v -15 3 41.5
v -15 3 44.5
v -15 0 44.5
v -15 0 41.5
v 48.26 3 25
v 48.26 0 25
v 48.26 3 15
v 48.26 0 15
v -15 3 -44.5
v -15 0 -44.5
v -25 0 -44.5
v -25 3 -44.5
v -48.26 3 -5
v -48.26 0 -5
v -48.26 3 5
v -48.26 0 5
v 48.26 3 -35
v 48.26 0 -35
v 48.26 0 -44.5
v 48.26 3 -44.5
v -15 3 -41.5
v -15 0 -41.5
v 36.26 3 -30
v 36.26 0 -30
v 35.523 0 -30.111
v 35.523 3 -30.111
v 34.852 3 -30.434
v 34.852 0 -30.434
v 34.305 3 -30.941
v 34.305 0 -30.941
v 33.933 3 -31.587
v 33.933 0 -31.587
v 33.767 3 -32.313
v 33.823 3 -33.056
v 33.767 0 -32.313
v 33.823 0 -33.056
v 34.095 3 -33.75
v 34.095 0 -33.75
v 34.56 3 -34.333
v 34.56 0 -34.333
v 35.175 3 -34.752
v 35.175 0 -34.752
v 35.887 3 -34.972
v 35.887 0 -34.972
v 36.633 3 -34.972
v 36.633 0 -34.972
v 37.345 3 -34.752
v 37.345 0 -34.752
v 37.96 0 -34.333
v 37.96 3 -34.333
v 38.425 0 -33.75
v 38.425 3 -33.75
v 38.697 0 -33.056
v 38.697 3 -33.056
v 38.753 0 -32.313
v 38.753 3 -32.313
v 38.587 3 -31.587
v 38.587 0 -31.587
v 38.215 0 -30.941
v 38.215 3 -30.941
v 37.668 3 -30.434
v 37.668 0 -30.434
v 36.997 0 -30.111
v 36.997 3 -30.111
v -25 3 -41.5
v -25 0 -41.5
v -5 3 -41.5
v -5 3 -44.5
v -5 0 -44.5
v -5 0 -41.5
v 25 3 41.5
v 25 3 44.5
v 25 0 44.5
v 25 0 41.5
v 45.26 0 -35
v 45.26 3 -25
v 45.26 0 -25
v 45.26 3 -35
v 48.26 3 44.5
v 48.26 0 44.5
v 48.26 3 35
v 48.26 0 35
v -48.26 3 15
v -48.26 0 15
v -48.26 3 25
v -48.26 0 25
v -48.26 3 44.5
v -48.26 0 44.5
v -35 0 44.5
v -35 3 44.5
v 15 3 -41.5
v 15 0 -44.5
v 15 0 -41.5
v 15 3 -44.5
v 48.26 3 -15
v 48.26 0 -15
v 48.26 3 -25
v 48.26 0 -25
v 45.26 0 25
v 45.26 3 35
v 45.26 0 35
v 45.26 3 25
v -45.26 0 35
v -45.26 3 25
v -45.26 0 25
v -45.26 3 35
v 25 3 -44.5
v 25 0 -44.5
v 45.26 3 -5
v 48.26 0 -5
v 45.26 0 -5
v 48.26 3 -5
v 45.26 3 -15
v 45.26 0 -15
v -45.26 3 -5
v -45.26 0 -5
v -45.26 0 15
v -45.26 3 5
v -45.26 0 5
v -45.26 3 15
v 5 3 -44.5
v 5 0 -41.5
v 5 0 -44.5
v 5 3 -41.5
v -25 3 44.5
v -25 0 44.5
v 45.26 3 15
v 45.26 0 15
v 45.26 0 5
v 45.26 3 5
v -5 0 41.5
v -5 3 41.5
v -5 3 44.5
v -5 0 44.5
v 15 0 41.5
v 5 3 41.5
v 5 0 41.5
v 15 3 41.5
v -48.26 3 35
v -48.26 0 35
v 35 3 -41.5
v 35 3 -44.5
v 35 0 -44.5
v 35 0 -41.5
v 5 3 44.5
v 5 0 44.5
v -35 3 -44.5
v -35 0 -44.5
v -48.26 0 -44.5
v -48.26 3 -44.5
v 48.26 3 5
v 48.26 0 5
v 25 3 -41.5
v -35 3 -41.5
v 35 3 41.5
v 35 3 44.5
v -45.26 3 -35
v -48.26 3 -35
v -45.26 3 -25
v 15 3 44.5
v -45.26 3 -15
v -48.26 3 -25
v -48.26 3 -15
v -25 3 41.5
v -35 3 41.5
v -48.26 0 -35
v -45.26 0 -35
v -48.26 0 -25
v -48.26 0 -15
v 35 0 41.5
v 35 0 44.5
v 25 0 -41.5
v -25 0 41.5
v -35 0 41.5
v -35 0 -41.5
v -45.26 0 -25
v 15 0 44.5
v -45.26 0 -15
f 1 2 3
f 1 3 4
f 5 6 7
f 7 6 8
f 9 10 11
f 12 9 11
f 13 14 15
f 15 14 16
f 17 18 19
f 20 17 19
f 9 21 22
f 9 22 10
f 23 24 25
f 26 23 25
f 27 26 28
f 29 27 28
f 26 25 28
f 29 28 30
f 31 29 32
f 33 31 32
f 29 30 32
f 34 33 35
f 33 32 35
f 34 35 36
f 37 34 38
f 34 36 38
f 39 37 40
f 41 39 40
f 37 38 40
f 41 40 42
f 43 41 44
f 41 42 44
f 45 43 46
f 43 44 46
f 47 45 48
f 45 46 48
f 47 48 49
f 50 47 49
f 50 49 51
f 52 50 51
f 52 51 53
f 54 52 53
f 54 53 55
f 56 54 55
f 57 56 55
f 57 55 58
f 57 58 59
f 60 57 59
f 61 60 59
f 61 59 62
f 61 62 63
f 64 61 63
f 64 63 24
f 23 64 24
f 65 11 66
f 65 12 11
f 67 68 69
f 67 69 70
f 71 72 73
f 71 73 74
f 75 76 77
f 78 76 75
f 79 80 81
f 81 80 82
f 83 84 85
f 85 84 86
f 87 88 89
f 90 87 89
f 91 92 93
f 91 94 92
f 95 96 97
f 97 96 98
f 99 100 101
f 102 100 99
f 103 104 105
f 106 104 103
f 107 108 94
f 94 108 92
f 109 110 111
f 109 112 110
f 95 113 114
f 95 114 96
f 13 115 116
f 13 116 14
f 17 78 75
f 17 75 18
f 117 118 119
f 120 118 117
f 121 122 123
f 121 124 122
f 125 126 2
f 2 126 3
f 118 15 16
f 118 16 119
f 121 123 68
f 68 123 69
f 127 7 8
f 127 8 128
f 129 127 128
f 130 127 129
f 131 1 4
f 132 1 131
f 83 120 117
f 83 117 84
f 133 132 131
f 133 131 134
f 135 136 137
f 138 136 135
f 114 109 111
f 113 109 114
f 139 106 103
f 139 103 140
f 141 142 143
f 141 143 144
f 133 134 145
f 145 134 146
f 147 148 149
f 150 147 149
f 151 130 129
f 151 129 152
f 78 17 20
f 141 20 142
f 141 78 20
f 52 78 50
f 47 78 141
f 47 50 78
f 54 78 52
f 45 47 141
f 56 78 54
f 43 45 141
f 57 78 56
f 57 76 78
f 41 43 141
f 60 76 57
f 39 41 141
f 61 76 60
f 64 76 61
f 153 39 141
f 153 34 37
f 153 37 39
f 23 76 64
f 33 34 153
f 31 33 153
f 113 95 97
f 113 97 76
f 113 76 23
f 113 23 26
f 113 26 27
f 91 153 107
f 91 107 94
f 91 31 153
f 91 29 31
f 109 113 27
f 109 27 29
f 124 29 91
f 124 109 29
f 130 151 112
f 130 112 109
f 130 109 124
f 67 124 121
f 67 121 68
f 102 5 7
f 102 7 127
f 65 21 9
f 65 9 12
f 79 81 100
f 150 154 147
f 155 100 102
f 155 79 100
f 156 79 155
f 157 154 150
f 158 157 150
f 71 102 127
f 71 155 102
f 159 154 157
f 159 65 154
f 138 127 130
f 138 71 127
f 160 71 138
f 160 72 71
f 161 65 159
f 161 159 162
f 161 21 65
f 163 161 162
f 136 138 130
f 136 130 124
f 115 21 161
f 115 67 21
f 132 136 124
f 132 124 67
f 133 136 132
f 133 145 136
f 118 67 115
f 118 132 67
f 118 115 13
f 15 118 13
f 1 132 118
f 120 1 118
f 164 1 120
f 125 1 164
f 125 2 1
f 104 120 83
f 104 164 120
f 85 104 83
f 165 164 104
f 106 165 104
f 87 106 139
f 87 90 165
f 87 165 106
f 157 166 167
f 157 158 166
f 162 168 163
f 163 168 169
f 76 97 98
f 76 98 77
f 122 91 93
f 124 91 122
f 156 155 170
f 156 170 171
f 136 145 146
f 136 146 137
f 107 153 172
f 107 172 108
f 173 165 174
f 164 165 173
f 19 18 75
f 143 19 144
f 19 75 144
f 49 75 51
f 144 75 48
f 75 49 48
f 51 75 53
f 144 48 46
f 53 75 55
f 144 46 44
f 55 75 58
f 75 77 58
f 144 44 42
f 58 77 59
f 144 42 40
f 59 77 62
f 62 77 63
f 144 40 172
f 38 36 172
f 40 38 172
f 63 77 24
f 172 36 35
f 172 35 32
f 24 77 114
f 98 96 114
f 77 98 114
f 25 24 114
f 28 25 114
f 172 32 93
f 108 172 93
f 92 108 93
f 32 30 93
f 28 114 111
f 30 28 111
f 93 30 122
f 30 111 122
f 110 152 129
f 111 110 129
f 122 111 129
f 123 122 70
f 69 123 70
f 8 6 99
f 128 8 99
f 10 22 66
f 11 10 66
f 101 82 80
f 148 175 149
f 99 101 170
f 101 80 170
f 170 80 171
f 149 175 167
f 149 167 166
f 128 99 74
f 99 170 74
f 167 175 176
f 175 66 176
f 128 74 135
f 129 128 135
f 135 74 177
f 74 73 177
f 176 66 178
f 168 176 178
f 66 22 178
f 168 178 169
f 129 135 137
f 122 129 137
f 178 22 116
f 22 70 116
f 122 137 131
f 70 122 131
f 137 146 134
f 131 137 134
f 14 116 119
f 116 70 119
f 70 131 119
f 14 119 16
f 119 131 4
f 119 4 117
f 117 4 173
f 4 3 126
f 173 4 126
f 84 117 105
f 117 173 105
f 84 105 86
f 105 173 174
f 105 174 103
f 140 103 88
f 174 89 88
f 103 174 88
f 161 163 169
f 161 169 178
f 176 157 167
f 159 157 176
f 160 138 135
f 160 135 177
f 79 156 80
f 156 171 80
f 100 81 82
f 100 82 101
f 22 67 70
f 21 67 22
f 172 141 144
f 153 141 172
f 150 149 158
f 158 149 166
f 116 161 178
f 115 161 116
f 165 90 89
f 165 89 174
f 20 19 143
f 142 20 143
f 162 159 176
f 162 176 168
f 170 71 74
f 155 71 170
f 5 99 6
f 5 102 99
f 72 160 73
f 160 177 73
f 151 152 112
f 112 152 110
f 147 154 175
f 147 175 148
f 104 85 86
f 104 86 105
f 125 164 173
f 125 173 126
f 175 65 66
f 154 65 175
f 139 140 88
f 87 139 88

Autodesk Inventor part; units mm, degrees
ref_plane "YZ Plane" through (0, 0, 0) normal (1, 0, 0) x (0, 1, 0)
ref_plane "XZ Plane" through (0, 0, 0) normal (0, 1, 0) x (-1, 0, 0)
ref_plane "XY Plane" through (0, 0, 0) normal (0, 0, 1) x (1, 0, 0)
sketch "Rectangle" plane through (0, 0, 0) normal (0, 1, 0) x (-1, 0, 0)
  line L0 (-48.26, -44.5) -> (48.26, -44.5)
  line L1 (48.26, -44.5) -> (48.26, 44.5)
  line L2 (48.26, 44.5) -> (-48.26, 44.5)
  line L3 (-48.26, 44.5) -> (-48.26, -44.5)
  line L4 (-48.26, -44.5) -> (48.26, 44.5) construction
  line L5 (48.26, -44.5) -> (-48.26, 44.5) construction
  point P0 (0, 0)
  dimension "d12" = 96.52
  dimension "d13" = 89
extrude "Extrusion1" add sketch "Rectangle" along normal blind 3
sketch "Sketch3" plane through (0, 3, 0) normal (0, 1, 0) x (1, 0, 0)
  line L0 (48.26, 44.5) -> (-48.26, 44.5) construction
  line L1 (-15, 44.5) -> (-5, 44.5)
  line L2 (-5, 44.5) -> (-5, 41.5)
  line L3 (-5, 41.5) -> (-15, 41.5)
  line L4 (-15, 41.5) -> (-15, 44.5)
  line L5 (0, 62.3) -> (0, -62.3) construction
  point P0 (0, 0)
  dimension "d14" = 10
  dimension "d16" = 3
  dimension "d22" = 5
extrude "Extrusion3" cut sketch "Sketch3" against normal through all
pattern_linear "Rectangular Pattern2" count 2 spacing 20 along (-1, 0, 0) count 2 spacing 40 along (1, 0, 0) of "Extrusion3"
mirror "Mirror2" about plane through (0, 0, 0) normal (0, 0, 1) of "Extrusion3", "Rectangular Pattern2"
sketch "Sketch4" plane through (0, 3, 0) normal (0, 1, 0) x (1, 0, 0)
  line L0 (67.564, 0) -> (-67.564, 0) construction
  line L1 (-48.26, 44.5) -> (-48.26, -44.5) construction
  line L2 (-48.26, 15) -> (-45.26, 15)
  line L3 (-45.26, 15) -> (-45.26, 5)
  line L4 (-45.26, 5) -> (-48.26, 5)
  line L5 (-48.26, 5) -> (-48.26, 15)
  point P0 (0, 0)
  dimension "d23" = 3
  dimension "d24" = 10
  dimension "d25" = 5
extrude "Extrusion4" cut sketch "Sketch4" against normal through all
pattern_linear "Rectangular Pattern3" count 2 spacing 20 along (0, 0, -1) count 2 spacing 40 along (0, 0, 1) of "Extrusion4"
mirror "Mirror4" about plane through (0, 0, 0) normal (1, 0, 0) of "Extrusion4", "Rectangular Pattern3"
sketch "Sketch5" plane through (0, 3, 0) normal (0, 1, 0) x (1, 0, 0)
  line L0 (48.26, 35) -> (48.26, 44.5) construction
  line L1 (48.26, 44.5) -> (35, 44.5) construction
  point P0 (0, 0)
  point P1 (36.26, 32.5)
  dimension "d31" = 12
  dimension "d32" = 12
hole "Hole1" at (36.26, 3, -32.5) direction (0, -1, 0) diameter 5 end through all
equation "\"d12\" = Module_Width"
equation "\"d13\" = Module_Height"
equation "\"d2\" = Module_Case_Thickness"
equation "\"d14\" = Module_Case_SlotWidth"
equation "\"d16\" = Module_Case_SlotDepth"
equation "\"d22\" = 0.5 * Module_Case_SlotWidth"
equation "\"d21\" = 2 * Module_Case_SlotWidth"
equation "\"d42\" = 4 * Module_Case_SlotWidth"
equation "\"d23\" = Module_Case_SlotDepth"
equation "\"d24\" = Module_Case_SlotWidth"
equation "\"d25\" = 0.5 * Module_Case_SlotWidth"
equation "\"d30\" = 2 * Module_Case_SlotWidth"
equation "\"d45\" = 4 * Module_Case_SlotWidth"
equation "\"d33\" = Module_StatusIndicatorDiameter"
equation "\"RackWidth\" = 482.6"
equation "\"U\" = 44.5"
equation "\"Module_Connector_Width\" = 6"
equation "\"Module_Case_SlotWidth\" = 10"
equation "\"Module_Case_SlotDepth\" = 3"
equation "\"Module_Back_Thickness\" = 5"
equation "\"Module_Connector_Depth\" = 4"
equation "\"Module_Height\" = 89"
equation "\"Module_Width\" = 96.52"
equation "\"Module_Case_Thickness\" = 3"
equation "\"Module_StatusIndicatorDiameter\" = 5"
equation "\"Module_Case_BottomSlotDepth\" = 5"
properties part number "BaseModule" material "Wood (Birch)"
